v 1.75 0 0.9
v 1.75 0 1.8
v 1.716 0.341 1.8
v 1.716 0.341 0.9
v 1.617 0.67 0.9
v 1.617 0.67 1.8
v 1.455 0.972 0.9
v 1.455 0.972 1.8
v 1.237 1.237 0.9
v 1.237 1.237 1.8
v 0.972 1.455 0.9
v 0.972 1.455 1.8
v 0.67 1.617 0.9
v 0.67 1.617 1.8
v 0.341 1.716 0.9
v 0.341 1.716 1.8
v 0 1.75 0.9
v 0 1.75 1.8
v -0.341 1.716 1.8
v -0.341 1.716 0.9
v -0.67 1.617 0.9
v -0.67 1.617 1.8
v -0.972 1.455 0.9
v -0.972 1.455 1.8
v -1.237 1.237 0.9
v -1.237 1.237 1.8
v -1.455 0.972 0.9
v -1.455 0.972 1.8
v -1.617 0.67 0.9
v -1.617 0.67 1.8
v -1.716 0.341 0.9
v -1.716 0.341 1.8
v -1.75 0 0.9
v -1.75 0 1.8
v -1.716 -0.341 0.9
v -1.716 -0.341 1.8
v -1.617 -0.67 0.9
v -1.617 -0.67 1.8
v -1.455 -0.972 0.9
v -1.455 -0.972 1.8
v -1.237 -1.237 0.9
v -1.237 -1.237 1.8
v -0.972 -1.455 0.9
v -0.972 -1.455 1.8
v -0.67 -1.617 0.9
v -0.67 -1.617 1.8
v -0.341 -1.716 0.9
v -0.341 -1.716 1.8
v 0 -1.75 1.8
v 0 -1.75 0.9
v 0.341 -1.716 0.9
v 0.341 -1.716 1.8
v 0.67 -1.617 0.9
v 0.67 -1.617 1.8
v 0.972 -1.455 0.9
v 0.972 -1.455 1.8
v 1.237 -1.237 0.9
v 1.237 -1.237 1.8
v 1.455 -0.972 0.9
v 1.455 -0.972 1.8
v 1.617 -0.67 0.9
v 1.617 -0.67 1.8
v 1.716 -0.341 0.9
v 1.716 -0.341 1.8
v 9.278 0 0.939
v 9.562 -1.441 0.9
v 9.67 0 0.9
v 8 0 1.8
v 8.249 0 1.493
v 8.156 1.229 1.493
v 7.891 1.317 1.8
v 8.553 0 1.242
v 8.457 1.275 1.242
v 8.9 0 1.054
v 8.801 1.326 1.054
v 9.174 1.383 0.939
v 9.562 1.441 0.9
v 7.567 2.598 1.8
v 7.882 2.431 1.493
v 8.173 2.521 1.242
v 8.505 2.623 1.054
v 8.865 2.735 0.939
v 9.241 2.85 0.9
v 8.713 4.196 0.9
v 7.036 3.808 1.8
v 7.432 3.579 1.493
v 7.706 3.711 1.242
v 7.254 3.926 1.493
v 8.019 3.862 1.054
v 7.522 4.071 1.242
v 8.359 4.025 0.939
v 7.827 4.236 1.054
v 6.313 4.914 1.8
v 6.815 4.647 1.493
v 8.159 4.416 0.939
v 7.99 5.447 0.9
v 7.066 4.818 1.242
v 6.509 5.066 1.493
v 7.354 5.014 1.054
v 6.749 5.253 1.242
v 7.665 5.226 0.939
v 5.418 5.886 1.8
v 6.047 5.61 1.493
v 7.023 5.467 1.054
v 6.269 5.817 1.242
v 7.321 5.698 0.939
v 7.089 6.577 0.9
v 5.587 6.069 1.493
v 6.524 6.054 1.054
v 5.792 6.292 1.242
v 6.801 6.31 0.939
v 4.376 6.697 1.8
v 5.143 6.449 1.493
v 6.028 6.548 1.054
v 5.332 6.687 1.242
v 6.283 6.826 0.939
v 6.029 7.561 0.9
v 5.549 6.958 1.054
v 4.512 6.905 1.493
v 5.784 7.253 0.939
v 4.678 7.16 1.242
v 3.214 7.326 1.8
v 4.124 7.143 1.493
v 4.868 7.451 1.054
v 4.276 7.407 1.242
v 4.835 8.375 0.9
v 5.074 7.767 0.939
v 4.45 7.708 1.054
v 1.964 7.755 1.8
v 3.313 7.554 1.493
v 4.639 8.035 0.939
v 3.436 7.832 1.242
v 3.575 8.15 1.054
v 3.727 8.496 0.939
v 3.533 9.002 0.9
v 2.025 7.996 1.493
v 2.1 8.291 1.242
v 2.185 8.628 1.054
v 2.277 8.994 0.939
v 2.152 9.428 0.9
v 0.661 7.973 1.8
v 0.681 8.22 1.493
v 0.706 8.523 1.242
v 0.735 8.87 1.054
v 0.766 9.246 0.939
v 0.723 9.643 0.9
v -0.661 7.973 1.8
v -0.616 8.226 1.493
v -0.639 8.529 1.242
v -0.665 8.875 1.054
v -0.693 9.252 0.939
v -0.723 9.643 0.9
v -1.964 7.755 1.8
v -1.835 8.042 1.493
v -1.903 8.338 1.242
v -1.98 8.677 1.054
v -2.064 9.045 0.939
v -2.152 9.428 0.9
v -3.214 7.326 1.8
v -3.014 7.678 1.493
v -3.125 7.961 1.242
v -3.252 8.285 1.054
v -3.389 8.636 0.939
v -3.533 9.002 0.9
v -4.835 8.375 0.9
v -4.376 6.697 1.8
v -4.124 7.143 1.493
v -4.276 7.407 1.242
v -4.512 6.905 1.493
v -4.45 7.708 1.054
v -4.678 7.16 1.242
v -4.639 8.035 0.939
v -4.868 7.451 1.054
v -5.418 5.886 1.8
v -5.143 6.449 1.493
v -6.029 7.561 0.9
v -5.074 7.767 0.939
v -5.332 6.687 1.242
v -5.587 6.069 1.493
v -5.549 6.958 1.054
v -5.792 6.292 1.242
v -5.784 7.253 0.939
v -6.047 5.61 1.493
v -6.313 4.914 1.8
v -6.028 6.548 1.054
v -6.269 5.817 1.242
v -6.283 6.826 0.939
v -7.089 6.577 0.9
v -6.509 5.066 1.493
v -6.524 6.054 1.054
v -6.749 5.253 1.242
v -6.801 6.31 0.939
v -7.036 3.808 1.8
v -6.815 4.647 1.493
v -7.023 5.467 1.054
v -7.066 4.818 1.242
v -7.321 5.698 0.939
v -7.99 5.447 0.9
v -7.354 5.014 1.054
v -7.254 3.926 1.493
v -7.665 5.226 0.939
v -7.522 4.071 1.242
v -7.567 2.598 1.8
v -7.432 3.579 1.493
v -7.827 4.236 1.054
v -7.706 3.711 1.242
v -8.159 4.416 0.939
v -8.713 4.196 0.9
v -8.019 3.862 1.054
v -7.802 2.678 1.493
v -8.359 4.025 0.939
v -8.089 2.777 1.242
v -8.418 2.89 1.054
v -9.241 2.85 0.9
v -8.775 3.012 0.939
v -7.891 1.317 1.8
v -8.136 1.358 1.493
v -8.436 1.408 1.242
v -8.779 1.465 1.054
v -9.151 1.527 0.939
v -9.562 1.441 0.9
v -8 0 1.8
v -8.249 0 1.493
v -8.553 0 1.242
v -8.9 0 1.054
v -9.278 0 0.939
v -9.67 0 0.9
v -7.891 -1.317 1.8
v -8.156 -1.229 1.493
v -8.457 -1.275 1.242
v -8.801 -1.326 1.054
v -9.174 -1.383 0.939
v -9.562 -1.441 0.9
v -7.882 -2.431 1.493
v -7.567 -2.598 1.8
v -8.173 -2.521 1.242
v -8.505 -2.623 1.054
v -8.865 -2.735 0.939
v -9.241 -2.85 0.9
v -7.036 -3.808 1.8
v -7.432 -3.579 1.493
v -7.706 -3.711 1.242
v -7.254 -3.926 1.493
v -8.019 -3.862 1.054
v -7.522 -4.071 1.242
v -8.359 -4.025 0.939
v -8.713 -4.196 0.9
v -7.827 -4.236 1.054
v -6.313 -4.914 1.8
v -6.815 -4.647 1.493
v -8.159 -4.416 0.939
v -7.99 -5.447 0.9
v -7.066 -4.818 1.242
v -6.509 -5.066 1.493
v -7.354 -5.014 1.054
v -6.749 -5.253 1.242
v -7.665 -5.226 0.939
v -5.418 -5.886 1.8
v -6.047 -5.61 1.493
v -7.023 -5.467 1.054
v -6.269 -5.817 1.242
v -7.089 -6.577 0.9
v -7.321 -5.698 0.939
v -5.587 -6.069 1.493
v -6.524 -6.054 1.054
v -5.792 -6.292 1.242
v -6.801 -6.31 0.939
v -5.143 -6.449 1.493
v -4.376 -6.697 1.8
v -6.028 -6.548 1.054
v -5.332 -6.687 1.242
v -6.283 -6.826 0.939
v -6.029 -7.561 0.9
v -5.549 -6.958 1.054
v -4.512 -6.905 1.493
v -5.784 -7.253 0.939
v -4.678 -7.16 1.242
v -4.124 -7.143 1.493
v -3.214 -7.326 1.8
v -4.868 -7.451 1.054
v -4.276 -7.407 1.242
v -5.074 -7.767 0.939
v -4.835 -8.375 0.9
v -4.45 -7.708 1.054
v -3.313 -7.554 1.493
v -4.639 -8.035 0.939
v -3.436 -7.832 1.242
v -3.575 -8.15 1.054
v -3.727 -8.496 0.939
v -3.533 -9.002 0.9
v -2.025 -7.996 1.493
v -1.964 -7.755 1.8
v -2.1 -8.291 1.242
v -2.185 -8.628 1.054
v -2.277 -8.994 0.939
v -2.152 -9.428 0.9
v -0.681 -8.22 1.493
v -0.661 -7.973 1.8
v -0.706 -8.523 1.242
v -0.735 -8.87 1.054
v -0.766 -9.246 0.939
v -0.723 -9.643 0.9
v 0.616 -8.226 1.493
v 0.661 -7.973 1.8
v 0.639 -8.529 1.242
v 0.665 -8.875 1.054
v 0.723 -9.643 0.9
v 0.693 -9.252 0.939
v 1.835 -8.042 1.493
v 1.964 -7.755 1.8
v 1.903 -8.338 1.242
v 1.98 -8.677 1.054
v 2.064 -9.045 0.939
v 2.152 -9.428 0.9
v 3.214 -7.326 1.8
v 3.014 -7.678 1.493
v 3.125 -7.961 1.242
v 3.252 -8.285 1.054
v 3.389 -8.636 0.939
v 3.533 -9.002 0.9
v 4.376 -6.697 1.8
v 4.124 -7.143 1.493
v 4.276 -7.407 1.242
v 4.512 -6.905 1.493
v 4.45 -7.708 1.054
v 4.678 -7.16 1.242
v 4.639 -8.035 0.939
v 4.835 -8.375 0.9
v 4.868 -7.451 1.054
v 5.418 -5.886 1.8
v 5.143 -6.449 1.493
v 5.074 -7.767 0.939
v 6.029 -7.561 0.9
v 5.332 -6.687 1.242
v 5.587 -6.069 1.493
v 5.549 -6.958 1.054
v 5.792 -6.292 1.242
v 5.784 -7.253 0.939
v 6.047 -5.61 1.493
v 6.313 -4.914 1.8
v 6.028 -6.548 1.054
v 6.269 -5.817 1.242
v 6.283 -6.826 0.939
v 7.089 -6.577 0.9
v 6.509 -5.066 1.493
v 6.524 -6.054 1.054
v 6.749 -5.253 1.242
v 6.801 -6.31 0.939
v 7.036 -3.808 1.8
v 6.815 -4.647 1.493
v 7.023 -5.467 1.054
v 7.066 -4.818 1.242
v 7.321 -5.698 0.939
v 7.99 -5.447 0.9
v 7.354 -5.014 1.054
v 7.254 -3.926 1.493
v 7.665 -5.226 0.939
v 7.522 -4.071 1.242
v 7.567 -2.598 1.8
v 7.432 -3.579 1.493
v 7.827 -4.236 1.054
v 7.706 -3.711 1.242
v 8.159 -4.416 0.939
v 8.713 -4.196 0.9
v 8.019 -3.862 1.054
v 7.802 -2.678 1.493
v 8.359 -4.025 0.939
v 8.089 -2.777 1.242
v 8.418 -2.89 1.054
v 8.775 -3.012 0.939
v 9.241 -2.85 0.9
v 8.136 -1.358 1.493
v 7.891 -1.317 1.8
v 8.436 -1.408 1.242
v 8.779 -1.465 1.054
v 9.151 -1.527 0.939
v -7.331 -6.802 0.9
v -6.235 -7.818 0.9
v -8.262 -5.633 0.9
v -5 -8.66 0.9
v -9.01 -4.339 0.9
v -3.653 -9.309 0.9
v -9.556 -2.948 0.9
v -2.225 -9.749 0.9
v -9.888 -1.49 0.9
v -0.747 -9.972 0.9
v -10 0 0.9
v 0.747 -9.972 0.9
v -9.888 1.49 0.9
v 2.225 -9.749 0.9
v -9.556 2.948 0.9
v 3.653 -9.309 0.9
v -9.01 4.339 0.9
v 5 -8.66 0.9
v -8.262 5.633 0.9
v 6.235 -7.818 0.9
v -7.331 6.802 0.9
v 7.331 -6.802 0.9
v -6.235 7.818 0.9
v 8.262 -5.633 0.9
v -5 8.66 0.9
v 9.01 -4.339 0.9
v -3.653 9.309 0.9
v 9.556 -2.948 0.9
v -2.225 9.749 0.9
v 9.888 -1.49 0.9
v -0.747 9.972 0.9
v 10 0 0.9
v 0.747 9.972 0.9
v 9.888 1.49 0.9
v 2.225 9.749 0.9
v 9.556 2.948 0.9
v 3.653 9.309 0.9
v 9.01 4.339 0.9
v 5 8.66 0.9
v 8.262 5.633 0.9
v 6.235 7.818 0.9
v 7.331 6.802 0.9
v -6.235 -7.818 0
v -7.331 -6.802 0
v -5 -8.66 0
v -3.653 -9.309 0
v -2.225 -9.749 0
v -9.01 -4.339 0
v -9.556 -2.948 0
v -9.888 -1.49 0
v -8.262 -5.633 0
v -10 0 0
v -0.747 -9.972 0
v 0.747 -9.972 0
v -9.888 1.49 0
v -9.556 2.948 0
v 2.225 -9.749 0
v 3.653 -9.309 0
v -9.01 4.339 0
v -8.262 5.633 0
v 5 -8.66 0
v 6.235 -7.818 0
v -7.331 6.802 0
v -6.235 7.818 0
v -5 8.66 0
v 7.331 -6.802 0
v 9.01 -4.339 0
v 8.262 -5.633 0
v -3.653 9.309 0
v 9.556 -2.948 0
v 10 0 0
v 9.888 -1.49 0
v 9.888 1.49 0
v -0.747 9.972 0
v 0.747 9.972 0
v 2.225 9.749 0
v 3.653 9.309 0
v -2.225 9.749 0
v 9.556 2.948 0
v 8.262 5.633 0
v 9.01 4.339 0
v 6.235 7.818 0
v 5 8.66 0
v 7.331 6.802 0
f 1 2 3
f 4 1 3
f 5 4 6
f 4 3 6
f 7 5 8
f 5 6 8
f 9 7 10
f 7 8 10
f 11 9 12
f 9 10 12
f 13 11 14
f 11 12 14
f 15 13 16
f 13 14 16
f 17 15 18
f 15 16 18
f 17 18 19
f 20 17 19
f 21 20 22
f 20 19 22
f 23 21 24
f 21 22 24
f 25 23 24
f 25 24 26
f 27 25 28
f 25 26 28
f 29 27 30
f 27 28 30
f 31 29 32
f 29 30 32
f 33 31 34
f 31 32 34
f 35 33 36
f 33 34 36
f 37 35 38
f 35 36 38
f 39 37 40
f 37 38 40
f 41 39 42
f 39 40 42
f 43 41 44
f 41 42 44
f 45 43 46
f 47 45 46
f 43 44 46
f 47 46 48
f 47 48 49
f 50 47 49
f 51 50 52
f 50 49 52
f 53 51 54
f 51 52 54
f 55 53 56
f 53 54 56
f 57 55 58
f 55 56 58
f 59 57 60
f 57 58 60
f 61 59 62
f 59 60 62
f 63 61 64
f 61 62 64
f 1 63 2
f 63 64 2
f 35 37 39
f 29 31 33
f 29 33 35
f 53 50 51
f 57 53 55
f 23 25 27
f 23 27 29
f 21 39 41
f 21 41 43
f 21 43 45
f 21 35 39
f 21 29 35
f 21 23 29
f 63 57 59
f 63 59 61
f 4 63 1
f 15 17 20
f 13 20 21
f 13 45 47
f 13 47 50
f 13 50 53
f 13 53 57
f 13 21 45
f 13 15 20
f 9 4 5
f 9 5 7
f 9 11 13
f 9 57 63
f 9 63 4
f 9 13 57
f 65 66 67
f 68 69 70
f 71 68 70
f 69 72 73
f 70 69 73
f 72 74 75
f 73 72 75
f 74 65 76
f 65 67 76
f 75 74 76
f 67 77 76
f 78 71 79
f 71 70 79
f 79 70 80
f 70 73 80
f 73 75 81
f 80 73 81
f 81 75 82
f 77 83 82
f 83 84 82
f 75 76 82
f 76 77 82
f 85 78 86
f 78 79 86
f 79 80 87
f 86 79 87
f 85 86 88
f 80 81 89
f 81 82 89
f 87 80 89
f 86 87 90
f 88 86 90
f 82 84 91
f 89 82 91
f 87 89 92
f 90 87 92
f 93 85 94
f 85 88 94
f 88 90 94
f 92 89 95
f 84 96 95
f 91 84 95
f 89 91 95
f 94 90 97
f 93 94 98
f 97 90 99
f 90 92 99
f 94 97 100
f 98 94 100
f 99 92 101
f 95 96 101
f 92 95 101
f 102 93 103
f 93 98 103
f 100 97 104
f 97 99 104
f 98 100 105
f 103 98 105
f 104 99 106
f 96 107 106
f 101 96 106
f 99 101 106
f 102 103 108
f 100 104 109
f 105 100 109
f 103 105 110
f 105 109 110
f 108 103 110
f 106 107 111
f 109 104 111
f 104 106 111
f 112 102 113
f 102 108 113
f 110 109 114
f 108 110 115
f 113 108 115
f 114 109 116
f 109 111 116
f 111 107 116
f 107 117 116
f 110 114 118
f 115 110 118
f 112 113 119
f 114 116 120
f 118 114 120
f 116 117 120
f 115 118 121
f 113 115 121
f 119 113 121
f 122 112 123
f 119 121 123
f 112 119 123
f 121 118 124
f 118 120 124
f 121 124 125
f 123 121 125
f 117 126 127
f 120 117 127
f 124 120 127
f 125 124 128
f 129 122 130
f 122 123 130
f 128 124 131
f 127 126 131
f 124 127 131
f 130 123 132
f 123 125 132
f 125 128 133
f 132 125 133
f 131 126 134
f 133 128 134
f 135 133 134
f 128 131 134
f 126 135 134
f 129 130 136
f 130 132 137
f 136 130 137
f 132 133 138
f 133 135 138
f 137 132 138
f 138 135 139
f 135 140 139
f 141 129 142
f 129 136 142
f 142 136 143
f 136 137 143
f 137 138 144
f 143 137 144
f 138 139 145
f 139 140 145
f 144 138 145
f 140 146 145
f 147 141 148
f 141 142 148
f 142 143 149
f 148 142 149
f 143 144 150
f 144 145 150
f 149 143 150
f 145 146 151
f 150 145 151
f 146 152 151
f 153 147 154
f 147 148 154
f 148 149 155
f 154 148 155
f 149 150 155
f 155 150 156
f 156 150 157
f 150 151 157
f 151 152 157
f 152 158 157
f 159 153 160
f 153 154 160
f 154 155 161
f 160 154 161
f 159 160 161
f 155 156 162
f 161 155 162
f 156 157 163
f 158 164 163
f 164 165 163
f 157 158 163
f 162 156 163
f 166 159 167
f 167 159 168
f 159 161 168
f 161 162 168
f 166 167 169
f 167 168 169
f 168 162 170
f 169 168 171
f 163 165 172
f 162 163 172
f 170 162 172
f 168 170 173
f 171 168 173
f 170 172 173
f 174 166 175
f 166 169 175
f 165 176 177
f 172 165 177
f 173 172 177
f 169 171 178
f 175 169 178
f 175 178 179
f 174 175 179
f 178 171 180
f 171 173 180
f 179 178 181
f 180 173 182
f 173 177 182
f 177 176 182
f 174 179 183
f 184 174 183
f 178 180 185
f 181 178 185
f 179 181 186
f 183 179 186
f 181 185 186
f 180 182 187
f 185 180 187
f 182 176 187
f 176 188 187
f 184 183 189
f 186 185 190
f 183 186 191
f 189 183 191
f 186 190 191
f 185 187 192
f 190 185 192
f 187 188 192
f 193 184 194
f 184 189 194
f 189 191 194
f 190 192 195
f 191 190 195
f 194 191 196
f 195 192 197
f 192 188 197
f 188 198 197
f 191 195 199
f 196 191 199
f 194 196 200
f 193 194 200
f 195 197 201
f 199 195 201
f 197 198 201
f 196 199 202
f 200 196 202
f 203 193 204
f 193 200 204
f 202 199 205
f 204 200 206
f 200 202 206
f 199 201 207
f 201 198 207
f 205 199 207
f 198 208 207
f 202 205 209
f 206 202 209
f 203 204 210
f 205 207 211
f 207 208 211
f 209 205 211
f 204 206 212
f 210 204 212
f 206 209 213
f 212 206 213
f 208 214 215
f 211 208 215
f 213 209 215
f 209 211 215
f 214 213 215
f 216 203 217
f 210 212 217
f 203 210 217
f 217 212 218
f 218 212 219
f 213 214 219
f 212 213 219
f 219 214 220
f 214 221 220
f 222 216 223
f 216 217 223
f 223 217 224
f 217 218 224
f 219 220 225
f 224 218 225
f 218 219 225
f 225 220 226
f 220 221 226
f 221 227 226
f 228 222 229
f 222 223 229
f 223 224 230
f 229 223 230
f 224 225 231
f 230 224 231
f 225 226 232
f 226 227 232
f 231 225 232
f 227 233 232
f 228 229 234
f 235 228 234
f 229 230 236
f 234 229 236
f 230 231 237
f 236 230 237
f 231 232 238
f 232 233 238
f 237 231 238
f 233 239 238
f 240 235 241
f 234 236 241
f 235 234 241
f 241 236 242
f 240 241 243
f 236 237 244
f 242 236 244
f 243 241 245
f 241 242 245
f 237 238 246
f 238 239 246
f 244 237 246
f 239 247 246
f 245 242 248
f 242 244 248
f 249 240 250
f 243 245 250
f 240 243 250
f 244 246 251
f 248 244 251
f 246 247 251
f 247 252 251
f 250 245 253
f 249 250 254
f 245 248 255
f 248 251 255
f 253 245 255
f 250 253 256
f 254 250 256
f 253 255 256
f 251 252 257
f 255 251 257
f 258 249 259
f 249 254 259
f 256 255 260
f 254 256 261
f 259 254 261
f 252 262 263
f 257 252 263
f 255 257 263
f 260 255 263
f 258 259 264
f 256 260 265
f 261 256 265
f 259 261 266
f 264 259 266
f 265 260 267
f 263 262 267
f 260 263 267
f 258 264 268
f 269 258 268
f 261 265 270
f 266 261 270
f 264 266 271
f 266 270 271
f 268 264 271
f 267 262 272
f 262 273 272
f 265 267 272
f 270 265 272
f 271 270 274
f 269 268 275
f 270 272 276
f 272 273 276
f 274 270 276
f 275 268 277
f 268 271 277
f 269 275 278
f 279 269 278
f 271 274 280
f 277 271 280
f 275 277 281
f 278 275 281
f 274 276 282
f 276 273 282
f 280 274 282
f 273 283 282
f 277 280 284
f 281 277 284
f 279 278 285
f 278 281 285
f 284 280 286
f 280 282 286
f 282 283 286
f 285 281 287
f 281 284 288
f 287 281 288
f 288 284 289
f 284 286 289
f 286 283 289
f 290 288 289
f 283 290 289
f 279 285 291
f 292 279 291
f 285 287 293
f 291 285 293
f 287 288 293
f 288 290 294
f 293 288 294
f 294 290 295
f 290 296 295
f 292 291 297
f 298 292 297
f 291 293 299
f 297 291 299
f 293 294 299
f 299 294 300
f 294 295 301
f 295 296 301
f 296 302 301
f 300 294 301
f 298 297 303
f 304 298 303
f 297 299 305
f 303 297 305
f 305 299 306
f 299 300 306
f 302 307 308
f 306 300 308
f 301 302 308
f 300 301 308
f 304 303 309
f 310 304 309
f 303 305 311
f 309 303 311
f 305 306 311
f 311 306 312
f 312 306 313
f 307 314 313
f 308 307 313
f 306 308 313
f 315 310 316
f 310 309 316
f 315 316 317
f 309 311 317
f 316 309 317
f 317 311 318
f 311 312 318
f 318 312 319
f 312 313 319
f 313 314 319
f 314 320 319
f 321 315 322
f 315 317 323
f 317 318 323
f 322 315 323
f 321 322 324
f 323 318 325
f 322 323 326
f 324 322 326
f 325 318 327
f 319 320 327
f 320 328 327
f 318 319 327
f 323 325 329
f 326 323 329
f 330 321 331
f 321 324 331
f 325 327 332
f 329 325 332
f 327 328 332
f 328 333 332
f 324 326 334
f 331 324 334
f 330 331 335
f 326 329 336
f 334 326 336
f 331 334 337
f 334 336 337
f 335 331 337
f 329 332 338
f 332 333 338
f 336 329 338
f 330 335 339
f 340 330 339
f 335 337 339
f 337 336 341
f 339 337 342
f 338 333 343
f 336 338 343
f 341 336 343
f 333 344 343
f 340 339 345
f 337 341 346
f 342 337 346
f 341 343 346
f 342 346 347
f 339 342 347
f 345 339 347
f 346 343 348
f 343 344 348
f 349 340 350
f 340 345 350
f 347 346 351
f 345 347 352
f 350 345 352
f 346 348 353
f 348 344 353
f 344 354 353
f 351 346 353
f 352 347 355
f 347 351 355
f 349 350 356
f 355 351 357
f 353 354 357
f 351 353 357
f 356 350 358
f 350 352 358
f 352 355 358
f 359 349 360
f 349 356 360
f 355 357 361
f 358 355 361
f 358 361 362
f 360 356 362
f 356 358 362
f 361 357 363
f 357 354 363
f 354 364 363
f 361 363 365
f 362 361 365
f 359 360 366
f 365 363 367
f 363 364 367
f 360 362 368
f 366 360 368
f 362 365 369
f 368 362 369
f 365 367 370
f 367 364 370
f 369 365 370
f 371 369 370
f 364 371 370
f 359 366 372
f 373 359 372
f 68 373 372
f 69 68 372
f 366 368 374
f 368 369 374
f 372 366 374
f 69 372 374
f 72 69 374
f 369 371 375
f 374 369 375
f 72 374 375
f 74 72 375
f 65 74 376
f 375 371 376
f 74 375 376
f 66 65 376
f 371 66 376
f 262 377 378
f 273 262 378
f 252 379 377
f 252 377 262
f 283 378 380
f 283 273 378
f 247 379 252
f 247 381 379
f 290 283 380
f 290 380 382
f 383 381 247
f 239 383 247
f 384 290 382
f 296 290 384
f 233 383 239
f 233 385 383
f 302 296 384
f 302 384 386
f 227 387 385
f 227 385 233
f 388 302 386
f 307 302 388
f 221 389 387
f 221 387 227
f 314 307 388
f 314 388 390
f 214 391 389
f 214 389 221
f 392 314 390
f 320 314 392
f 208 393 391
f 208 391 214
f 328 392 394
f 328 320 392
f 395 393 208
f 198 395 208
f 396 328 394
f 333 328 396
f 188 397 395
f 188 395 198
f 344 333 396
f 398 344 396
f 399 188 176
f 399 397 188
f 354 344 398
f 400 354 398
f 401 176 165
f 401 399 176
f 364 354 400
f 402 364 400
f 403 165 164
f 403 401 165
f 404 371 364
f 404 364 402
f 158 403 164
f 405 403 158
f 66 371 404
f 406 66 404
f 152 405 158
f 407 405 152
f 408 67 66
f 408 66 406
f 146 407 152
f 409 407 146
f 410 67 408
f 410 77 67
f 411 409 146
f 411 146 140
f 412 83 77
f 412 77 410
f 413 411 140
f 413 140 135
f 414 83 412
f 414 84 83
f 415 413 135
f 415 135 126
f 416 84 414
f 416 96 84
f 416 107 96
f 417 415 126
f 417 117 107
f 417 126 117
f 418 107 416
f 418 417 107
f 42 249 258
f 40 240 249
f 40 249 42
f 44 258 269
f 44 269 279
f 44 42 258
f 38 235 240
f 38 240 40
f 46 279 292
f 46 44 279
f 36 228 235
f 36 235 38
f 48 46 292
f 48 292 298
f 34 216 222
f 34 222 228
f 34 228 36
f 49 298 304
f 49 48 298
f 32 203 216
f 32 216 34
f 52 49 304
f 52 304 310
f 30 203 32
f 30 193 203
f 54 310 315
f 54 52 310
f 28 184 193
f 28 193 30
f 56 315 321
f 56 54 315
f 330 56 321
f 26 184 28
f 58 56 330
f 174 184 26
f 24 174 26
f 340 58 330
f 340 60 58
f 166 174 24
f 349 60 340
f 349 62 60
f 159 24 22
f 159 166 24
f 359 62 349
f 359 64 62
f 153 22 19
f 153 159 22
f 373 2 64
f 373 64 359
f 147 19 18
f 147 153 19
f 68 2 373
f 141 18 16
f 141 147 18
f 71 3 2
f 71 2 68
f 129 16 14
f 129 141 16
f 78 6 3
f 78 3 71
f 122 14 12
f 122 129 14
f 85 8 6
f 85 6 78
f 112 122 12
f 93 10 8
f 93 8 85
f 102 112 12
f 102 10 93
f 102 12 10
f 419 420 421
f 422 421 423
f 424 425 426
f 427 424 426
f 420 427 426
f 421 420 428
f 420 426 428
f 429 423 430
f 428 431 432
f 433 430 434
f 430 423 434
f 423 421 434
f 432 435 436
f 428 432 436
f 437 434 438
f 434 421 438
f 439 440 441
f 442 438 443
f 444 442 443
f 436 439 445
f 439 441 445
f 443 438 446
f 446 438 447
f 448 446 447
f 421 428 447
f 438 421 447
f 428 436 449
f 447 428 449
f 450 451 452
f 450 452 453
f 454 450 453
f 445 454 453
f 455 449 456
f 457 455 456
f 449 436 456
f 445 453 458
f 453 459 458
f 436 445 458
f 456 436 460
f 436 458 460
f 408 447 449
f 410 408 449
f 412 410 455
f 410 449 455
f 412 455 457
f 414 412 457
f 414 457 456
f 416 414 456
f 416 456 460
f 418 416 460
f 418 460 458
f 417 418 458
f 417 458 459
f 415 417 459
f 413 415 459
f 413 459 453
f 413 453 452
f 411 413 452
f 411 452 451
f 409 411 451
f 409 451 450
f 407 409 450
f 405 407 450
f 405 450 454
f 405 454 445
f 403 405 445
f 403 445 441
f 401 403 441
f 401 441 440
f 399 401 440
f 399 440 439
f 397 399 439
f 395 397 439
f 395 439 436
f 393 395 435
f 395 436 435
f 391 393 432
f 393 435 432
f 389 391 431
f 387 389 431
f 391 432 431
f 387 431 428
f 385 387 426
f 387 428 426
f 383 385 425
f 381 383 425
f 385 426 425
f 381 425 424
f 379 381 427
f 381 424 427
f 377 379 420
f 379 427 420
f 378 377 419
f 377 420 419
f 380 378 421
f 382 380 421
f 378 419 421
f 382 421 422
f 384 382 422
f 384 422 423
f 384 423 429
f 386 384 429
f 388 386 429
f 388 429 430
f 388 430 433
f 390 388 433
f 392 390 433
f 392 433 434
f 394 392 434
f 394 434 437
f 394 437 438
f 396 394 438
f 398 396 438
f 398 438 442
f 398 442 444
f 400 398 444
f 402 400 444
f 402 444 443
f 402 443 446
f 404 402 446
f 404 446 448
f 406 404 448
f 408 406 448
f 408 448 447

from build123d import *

# Parameters (mm, degrees)
SKETCH1_R           = 10
BOSS_EXTRUDE1_DEPTH = 1.8
CUT_EXTRUDE1_START  = -0.9
SKETCH2_R           = 10
SKETCH2_R_2         = 8
CUT_EXTRUDE1_DEPTH  = 0.9
FILLET2_R           = 2
SKETCH3_R           = 1.75
CUT_EXTRUDE2_DEPTH  = 0.9


with BuildPart() as part:
    # Sketch1 → Boss-Extrude1 (new body)
    with BuildSketch(Plane(origin=(0, 0, 0), x_dir=(0, 1, 0), z_dir=(0, 0, 1))):
        with Locations(Location((0, 0, 0), (0, 0, 270))):
            Circle(SKETCH1_R)
    extrude(amount=BOSS_EXTRUDE1_DEPTH)

    # Sketch2 → Cut-Extrude1 (cut)
    with BuildSketch(Plane.XY.offset(1.8).offset(CUT_EXTRUDE1_START)):
        Circle(SKETCH2_R)
        Circle(SKETCH2_R_2, mode=Mode.SUBTRACT)
    extrude(amount=CUT_EXTRUDE1_DEPTH, mode=Mode.SUBTRACT)

    # Fillet2
    # the kernel refuses this fillet: 2 mm, written as the material it adds along each edge
    with BuildSketch(Plane(origin=(0, 0, 0.9), x_dir=(1, 0, 0), z_dir=(0, -1, 0))) as fillet2_piece_1:
        with BuildLine():
            CenterArc((9.670329309, 2), FILLET2_R, 213.367012969, 56.632987031)
            Line((8, 0.9), (7.966593414, 0.878))
            ThreePointArc((7.966593414, 0.878), (7.96, 0.45), (7.96, 0))
            Line((7.96, 0), (8, -0.04))
            Line((8, -0.04), (9.670329309, -0.04))
            Line((9.670329309, -0.04), (9.670329309, 0))
        make_face()
    revolve(axis=Axis((0, 0, 0.9), (0, 0, 1)))

    # Sketch3 → Cut-Extrude2 (cut)
    with BuildSketch(Plane.XY.offset(1.8)):
        Circle(SKETCH3_R)
    extrude(amount=-CUT_EXTRUDE2_DEPTH, mode=Mode.SUBTRACT)


solid = part.part
